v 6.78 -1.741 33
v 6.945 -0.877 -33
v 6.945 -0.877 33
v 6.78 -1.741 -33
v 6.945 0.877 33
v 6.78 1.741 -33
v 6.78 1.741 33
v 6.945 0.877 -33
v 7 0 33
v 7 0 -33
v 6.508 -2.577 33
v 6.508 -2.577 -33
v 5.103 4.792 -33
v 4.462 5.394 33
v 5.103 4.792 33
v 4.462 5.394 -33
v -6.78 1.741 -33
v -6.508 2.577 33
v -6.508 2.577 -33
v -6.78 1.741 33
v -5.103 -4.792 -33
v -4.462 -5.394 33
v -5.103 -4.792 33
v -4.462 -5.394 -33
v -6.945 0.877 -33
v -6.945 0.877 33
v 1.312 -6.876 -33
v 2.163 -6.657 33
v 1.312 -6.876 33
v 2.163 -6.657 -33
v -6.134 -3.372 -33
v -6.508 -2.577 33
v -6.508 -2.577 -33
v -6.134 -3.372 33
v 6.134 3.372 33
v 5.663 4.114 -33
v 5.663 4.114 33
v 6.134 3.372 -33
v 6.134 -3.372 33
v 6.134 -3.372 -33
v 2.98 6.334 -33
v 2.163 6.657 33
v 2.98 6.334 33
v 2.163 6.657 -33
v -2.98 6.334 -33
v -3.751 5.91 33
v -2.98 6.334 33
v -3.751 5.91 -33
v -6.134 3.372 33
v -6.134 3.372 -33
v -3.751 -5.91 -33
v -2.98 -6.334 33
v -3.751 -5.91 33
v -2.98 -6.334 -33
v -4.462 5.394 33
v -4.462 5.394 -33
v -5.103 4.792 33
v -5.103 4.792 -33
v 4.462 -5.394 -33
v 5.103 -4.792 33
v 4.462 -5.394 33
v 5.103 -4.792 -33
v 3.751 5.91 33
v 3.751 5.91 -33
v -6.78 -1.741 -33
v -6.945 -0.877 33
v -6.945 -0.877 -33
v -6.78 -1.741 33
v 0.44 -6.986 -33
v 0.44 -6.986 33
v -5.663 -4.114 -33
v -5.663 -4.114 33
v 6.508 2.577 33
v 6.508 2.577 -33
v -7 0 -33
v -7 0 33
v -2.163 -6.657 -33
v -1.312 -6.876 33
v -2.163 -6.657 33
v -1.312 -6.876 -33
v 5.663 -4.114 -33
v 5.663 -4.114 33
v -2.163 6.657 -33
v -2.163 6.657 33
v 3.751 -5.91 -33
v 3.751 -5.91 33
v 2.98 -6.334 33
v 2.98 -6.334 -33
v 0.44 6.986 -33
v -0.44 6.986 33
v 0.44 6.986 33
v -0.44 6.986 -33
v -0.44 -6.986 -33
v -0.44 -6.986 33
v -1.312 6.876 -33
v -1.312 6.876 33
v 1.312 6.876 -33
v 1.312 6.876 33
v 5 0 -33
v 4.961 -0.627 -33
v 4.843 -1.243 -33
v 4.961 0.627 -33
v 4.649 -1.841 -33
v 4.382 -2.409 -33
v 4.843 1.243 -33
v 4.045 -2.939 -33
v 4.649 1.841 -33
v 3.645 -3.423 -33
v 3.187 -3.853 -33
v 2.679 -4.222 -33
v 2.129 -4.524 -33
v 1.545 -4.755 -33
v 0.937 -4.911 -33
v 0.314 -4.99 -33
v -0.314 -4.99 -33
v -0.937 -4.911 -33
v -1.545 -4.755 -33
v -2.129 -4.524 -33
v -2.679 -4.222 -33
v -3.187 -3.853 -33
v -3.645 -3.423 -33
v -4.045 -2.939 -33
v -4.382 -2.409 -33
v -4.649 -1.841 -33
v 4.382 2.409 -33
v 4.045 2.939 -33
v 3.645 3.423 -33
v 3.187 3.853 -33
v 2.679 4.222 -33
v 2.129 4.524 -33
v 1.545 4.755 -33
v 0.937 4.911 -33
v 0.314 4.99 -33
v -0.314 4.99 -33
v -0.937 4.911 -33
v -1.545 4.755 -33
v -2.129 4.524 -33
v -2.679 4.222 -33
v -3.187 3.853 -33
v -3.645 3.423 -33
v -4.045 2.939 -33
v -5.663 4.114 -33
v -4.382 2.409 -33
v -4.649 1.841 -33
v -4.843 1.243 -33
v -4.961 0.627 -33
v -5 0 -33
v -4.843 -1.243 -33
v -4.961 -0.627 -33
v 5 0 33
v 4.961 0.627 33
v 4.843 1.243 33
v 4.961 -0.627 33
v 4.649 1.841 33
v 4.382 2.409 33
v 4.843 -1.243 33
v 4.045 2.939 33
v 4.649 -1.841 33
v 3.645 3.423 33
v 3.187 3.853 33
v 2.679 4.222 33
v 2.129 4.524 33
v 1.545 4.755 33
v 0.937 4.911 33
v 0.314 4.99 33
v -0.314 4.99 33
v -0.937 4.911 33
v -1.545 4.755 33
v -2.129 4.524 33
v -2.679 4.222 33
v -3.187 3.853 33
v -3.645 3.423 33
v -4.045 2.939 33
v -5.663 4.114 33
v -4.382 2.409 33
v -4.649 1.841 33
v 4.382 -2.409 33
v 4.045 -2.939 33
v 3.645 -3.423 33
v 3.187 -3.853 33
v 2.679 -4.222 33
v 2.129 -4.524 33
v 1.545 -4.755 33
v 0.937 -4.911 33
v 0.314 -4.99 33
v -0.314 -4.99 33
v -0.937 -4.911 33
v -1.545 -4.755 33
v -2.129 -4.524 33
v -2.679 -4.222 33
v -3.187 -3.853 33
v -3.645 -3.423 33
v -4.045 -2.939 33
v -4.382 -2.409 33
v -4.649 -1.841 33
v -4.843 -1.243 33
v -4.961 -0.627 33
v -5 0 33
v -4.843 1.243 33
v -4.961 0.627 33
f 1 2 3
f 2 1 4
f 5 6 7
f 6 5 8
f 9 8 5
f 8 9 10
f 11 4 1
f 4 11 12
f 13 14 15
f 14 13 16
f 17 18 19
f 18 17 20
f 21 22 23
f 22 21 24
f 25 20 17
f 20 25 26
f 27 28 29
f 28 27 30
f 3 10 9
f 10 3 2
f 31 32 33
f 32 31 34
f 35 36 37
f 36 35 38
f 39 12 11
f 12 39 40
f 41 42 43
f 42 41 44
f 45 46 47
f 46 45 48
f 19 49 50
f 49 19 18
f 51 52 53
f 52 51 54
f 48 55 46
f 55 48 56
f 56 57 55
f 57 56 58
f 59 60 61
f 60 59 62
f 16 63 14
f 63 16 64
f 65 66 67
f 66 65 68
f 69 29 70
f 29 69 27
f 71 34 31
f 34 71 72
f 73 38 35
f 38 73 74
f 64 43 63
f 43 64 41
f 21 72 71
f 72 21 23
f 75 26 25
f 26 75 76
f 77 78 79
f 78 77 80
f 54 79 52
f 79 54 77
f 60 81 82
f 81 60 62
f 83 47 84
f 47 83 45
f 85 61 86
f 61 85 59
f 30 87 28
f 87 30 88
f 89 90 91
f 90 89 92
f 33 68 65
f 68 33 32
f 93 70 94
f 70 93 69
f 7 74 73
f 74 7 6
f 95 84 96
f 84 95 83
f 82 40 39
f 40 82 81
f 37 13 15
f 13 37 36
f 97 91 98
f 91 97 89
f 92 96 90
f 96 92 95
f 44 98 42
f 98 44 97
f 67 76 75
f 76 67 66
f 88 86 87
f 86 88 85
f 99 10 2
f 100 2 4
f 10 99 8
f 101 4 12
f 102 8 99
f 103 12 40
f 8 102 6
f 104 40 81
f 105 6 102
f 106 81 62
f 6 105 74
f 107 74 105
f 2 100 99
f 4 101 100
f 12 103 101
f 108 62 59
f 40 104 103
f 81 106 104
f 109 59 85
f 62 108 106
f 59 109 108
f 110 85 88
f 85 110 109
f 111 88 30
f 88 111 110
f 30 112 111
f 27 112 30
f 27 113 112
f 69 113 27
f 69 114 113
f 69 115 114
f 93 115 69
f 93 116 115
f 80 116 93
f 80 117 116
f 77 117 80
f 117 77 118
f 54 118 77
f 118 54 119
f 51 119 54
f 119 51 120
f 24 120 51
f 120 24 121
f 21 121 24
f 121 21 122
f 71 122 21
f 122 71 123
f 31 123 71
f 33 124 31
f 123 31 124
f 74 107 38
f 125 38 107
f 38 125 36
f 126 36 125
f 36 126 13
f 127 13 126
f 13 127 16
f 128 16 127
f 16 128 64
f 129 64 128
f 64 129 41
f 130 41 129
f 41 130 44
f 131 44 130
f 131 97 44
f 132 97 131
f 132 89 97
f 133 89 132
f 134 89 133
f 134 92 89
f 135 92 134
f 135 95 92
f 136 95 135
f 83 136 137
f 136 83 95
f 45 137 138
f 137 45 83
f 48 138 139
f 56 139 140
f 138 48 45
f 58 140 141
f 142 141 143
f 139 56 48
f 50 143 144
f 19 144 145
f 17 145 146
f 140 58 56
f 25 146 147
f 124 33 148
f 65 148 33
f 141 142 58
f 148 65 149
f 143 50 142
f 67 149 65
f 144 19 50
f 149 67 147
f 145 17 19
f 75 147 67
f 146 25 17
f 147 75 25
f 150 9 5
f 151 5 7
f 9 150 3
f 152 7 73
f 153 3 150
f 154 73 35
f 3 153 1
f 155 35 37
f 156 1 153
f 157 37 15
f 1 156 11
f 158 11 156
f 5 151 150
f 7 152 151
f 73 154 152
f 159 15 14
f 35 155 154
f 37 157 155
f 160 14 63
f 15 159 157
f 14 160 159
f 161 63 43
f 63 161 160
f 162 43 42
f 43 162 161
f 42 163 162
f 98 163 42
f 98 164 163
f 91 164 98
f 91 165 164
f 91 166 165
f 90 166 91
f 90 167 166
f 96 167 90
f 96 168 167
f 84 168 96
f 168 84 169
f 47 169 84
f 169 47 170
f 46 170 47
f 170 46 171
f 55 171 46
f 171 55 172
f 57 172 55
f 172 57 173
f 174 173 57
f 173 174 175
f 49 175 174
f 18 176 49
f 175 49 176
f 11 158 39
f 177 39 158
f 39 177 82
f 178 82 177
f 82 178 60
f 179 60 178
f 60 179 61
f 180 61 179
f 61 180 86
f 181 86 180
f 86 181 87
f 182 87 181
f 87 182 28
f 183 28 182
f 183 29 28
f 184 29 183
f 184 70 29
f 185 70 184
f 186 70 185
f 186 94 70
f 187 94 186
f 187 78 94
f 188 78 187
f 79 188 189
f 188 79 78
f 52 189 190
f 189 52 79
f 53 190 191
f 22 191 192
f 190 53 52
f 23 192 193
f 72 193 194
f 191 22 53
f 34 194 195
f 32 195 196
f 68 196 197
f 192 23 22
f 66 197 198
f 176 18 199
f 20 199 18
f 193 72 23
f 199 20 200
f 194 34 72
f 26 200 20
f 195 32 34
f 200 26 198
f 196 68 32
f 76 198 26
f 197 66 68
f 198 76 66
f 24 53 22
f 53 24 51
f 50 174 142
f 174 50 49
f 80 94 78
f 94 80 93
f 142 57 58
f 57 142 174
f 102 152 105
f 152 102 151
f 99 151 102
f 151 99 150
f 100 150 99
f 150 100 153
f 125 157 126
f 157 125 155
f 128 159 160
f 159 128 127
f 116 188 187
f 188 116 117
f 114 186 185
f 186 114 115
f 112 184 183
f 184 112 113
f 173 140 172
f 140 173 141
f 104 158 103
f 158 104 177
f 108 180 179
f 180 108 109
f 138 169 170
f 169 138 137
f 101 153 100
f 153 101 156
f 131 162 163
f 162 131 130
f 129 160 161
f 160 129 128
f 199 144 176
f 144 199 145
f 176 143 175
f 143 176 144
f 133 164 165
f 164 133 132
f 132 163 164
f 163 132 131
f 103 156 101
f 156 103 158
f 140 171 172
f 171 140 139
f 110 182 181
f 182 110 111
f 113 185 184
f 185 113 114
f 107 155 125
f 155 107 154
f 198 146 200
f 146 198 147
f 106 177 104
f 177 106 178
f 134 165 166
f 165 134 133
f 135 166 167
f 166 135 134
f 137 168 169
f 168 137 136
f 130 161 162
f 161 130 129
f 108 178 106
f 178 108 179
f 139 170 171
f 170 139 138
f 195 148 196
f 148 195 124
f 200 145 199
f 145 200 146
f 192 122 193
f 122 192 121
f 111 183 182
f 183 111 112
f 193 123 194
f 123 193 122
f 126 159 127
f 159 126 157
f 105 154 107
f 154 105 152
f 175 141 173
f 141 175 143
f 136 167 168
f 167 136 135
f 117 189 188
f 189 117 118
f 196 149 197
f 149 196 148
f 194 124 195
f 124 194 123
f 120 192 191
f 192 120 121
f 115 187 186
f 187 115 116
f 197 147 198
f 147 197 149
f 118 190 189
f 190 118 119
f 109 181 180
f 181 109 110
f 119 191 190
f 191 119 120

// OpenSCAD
$fn = 50;


difference() {
	union() {
		translate(v = [0, 0, -33.0000000000]) {
			cylinder(h = 66, r = 7.0000000000);
		}
	}
	union() {
		translate(v = [0, 0, -100.0000000000]) {
			cylinder(h = 200, r = 5.0000000000);
		}
	}
}
